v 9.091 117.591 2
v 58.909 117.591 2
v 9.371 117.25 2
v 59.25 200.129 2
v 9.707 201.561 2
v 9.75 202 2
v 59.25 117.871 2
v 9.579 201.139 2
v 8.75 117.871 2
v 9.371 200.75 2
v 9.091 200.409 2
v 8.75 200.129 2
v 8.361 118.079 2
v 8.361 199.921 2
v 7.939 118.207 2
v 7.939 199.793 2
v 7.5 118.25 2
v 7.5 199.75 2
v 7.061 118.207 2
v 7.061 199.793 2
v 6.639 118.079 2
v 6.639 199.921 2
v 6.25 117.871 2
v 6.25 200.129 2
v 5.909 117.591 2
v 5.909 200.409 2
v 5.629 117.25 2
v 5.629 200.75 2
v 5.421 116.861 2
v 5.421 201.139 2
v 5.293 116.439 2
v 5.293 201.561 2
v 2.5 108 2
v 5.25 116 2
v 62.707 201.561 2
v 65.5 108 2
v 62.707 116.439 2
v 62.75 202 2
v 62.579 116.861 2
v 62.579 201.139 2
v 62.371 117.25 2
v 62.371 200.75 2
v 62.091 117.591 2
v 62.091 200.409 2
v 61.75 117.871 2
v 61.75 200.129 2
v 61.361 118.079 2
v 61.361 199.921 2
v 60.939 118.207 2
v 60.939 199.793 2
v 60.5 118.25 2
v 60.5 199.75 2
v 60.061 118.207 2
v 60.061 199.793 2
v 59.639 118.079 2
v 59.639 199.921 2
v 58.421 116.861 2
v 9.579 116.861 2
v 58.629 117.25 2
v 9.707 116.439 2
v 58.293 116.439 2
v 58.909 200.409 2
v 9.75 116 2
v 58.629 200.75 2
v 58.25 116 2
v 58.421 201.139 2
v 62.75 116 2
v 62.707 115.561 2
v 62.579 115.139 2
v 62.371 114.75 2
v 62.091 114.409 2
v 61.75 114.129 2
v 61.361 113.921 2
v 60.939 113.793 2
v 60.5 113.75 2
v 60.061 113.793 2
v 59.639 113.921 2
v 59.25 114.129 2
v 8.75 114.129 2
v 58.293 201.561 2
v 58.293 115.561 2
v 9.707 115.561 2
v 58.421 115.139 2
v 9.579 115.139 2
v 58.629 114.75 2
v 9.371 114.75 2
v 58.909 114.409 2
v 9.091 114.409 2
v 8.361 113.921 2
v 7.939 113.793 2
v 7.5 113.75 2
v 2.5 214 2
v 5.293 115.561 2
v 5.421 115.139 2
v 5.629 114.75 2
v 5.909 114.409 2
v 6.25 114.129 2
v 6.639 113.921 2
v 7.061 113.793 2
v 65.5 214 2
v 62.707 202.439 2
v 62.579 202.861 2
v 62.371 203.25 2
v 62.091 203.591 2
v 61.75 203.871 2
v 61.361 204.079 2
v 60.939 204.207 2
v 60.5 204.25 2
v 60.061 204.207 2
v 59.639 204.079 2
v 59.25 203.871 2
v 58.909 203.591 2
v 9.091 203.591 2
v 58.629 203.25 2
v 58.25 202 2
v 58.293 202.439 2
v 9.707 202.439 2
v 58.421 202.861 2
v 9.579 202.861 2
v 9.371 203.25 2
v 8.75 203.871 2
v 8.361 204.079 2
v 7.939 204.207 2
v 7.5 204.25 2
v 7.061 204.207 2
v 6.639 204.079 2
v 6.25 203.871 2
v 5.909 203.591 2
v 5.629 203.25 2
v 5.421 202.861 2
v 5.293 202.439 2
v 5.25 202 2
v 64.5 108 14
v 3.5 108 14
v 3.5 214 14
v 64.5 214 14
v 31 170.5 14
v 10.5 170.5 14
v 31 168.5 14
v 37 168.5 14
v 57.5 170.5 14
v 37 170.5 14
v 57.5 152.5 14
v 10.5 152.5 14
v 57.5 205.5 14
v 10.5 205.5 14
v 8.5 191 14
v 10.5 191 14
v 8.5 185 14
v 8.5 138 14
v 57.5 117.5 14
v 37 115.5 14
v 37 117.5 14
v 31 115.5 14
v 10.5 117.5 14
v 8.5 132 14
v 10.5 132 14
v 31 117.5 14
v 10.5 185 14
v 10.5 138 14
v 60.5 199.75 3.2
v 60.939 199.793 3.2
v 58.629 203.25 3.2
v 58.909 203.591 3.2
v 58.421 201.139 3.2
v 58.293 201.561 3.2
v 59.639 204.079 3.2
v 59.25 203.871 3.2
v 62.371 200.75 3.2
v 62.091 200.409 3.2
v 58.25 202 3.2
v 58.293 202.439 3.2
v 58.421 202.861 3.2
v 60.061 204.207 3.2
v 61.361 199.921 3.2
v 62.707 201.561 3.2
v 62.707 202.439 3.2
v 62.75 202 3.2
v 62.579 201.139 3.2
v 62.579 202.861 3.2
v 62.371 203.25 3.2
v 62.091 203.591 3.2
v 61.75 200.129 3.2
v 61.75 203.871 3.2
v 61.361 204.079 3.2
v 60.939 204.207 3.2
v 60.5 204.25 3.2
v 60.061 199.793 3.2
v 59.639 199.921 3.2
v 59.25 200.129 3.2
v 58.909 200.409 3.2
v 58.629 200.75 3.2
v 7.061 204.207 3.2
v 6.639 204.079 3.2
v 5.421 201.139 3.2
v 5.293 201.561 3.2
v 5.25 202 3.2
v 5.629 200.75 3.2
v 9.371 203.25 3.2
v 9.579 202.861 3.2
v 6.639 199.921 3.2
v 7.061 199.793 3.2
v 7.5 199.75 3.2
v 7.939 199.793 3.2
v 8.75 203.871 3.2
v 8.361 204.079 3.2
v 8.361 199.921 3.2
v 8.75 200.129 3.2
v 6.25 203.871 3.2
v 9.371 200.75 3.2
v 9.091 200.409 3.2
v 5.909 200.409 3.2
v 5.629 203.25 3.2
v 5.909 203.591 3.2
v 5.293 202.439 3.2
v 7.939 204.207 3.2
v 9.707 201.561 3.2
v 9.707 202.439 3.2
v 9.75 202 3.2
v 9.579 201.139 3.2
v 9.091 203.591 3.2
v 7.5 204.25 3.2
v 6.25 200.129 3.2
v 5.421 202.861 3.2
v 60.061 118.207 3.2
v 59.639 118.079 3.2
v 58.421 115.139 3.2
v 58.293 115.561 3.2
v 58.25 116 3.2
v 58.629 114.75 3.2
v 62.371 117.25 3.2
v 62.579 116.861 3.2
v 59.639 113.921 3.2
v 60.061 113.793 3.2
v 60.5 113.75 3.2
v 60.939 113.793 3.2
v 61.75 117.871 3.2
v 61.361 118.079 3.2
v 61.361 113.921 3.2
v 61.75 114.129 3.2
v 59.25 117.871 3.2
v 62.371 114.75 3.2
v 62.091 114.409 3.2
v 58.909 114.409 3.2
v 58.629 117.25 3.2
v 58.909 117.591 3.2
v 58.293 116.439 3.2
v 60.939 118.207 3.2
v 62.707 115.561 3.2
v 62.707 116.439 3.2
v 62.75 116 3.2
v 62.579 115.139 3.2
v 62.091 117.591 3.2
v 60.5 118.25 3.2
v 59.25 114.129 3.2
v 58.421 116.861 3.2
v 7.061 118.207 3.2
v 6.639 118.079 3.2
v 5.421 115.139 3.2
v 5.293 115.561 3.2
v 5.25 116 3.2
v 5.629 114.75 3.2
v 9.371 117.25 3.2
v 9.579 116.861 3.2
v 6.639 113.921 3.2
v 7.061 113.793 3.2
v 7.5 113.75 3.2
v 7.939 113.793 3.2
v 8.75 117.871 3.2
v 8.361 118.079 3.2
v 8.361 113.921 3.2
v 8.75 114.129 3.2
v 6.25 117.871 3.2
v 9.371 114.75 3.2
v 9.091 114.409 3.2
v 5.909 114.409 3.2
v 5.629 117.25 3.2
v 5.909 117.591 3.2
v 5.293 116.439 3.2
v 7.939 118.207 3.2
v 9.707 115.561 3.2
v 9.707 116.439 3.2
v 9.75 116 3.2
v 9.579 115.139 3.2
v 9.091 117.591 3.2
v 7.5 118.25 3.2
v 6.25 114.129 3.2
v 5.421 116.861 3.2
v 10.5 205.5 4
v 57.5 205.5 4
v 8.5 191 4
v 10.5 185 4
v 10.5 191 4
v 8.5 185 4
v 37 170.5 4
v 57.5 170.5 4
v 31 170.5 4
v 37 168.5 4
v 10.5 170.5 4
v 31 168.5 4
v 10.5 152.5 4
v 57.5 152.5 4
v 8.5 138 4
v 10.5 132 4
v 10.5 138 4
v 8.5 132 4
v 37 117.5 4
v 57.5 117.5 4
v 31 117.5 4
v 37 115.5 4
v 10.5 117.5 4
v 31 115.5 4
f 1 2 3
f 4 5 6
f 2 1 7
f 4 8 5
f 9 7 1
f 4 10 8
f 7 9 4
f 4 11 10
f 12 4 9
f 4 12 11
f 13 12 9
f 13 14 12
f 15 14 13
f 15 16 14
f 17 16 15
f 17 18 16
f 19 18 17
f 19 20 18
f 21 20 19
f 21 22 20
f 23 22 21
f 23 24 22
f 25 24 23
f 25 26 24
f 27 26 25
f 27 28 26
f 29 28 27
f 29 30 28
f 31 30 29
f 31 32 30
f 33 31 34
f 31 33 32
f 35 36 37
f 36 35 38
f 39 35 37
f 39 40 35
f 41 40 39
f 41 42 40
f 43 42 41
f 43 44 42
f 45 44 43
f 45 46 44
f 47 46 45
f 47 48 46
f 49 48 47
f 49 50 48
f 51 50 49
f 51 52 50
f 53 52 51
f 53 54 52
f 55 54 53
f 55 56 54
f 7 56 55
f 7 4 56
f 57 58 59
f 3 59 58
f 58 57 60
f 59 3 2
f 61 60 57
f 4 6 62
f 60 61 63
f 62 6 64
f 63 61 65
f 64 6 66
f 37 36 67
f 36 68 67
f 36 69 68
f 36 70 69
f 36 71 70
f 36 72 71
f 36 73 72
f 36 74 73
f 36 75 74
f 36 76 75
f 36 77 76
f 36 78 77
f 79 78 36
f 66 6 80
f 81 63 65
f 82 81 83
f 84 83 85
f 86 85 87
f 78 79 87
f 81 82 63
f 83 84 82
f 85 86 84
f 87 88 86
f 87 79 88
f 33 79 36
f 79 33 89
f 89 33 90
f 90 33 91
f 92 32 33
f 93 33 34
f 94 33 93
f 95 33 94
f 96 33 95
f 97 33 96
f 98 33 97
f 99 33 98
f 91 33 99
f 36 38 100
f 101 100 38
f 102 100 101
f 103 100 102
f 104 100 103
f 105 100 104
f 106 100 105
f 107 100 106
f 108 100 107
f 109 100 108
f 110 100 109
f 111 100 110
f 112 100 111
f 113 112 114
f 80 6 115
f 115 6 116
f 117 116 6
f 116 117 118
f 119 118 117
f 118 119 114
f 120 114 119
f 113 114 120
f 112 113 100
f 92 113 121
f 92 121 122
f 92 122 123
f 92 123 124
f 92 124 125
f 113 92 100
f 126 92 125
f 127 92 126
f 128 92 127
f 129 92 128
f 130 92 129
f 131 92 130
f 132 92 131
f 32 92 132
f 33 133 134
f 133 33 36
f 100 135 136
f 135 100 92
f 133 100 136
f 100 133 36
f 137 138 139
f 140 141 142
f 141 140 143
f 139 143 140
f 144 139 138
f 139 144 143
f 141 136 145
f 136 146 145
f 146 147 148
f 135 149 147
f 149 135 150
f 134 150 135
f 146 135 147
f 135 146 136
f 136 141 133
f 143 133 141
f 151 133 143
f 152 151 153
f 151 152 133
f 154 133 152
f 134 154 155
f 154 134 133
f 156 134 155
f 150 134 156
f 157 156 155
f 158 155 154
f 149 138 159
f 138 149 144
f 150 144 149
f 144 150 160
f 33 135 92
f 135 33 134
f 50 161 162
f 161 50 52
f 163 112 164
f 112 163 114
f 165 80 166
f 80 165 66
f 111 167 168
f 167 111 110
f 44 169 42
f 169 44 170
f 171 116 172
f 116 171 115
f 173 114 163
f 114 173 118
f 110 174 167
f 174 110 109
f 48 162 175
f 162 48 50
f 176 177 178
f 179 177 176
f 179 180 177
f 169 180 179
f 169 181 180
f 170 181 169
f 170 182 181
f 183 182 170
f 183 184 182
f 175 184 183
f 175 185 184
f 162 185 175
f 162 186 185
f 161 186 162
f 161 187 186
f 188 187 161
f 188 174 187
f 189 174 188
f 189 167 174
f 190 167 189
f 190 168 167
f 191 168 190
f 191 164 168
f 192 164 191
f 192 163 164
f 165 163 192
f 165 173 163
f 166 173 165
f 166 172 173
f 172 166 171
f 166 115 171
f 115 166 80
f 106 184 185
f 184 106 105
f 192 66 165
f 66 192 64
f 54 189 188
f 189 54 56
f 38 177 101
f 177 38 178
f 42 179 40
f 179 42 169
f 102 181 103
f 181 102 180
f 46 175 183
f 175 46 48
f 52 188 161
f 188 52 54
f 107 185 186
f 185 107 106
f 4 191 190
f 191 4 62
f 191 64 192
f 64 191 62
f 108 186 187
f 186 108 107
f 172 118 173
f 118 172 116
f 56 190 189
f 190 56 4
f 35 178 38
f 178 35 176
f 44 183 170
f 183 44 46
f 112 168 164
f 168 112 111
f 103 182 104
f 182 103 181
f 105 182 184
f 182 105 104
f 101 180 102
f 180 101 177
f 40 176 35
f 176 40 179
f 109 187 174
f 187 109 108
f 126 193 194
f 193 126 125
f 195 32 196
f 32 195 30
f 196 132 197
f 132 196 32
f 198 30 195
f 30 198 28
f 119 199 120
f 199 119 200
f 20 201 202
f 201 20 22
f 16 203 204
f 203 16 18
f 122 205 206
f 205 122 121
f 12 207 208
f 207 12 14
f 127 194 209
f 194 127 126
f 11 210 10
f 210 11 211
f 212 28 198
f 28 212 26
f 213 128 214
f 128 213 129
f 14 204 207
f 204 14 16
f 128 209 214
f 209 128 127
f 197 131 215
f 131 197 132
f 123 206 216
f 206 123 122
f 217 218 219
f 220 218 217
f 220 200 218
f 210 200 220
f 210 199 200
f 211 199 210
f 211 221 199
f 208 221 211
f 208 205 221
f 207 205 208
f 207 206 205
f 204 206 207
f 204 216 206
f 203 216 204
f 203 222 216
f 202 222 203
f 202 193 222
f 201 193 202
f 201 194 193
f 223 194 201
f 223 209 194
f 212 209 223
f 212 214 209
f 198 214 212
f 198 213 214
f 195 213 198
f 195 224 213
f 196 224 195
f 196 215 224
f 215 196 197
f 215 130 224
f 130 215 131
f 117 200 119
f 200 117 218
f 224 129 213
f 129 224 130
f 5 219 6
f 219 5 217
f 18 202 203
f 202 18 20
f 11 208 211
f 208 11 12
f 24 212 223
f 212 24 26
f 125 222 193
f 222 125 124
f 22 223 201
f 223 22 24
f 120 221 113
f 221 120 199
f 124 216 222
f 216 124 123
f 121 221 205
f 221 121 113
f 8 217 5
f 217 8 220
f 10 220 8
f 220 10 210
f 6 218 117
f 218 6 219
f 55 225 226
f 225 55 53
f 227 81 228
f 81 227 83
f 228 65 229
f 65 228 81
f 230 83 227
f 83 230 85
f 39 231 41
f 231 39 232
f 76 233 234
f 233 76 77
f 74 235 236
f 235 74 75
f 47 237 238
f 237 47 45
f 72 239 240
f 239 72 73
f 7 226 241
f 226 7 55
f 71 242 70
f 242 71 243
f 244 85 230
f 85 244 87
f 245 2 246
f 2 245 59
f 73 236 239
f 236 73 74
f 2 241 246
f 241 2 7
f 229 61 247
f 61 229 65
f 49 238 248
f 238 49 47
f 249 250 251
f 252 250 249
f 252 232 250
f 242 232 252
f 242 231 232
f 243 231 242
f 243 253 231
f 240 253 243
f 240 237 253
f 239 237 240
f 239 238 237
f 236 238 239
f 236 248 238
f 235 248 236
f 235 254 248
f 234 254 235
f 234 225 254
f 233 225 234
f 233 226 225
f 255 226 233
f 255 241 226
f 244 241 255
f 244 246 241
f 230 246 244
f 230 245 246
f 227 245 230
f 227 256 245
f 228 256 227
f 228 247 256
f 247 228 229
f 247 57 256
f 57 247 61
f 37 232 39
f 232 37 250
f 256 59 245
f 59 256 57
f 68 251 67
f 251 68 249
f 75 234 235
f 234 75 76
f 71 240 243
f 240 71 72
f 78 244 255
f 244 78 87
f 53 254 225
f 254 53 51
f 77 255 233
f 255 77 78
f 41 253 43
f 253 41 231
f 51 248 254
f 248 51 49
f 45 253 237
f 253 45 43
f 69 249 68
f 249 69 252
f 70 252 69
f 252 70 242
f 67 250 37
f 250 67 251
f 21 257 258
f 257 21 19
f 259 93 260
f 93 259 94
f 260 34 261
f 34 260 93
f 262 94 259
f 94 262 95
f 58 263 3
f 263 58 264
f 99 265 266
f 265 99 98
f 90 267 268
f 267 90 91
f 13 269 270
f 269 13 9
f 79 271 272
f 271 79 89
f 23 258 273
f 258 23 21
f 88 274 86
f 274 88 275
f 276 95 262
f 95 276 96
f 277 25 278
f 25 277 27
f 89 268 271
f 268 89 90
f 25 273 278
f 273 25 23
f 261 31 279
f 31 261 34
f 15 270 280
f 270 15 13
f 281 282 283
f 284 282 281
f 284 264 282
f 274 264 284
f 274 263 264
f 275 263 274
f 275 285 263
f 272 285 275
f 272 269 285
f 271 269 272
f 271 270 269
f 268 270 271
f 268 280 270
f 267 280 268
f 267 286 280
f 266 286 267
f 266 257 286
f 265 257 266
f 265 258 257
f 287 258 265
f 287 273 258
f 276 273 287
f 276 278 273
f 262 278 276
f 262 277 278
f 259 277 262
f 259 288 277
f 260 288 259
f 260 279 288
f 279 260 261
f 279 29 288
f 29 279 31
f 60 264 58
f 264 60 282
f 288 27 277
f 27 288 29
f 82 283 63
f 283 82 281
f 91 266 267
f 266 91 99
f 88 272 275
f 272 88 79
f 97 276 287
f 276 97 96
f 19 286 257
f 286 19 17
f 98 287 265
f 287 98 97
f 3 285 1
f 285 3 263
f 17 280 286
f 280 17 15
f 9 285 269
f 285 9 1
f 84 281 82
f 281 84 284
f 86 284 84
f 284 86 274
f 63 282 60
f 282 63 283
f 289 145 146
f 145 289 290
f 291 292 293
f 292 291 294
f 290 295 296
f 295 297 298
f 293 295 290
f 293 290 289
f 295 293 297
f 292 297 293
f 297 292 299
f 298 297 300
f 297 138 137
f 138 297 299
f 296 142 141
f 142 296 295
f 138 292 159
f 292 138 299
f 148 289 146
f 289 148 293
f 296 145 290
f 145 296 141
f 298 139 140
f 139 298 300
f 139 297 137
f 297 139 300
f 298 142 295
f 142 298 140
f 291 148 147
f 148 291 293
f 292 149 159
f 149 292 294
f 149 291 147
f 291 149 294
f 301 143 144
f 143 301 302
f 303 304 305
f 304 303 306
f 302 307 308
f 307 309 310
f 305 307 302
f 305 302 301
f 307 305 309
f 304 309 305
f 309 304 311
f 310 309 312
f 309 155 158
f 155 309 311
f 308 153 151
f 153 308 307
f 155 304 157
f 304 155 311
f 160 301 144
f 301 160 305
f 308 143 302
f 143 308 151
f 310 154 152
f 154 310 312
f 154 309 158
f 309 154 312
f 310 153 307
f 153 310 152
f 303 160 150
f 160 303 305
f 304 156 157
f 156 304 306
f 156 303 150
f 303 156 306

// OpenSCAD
// file: Commons.scad
arduino_depth = 53.5;
arduino_width = 69;
arduino_mega_width = 102;

raspberry_depth = 56;
raspberry_width = 85;

breadboard_width = 166;
breadboard_depth = 55;
breadboard_height = 10;

mini_breadboard_depth = 34;
mini_breadboard_width = 46;

magnet_height = 1.2;
magnet_diameter = 4;

delta = 0.5;

plate_thickness = 2;
wall_thickness = 2;

slot_width = arduino_mega_width + 2*wall_thickness; // 106
slot_depth = raspberry_depth + 2*wall_thickness + 2 + 2*delta; // 63

width = 2*slot_width + wall_thickness; // 214
depth = slot_depth + breadboard_depth + 3*wall_thickness + 1 + 4*delta; // 125
height = breadboard_height + plate_thickness; // height over plate, 12

small_slot_depth = depth - slot_depth - 2*wall_thickness - 2*delta; // 58
small_slot_width = width - breadboard_width - 3*wall_thickness - 1 - 4*delta; // 39


module module_frame() {
    difference() {
        union() {
            translate([wall_thickness + 1, 0, 0])
                cube([slot_depth - 2*wall_thickness - 2, slot_width, plate_thickness]);

            translate([0, slot_width, 0]) rotate([90, 0, 0]) linear_extrude(slot_width)
                polygon([[0, 0], [1, height], [3, height], [3, 0]]);

            translate([slot_depth - wall_thickness - 1, slot_width, 0]) rotate([90, 0, 0]) linear_extrude(slot_width)
                polygon([[0, 0], [0, height], [wall_thickness, height], [3, 0]]);
        }
        
        magnet_hole(5, wall_thickness + 10, -delta);
        magnet_hole(slot_depth - 5, wall_thickness + 10, -delta);
        magnet_hole(5, wall_thickness + slot_width - 10, -delta);
        magnet_hole(slot_depth - 5, wall_thickness + slot_width - 10, -delta);       
    }

    translate([wall_thickness + 1, slot_width - 1, plate_thickness])
        cube([slot_depth - 2*wall_thickness - 2, 1, height - plate_thickness]);
}

module small_module_frame() {
    difference() {
        union() {
            translate([0, wall_thickness + 1, 0])
                cube([small_slot_depth, small_slot_width - 2*wall_thickness - 2, plate_thickness]);

            rotate([90, 0, 90]) linear_extrude(small_slot_depth)
                polygon([[0, 0], [1, height], [wall_thickness + 1, height], [wall_thickness + 1, 0]]);

            translate([0, small_slot_width - wall_thickness - 1, 0]) rotate([90, 0, 90]) linear_extrude(small_slot_depth)
                polygon([[0, 0], [0, height], [wall_thickness, height], [wall_thickness + 1, 0]]);

            translate([0, wall_thickness + 1, 0])
                cube([1, small_slot_width - 2*wall_thickness - 2, height]);
        }
        
        magnet_hole(8, 8, -delta);
        magnet_hole(8, small_slot_width - 8, -delta);
        magnet_hole(small_slot_depth - 8, 8, -delta);
        magnet_hole(small_slot_depth - 8, small_slot_width - 8, -delta);
    }
}

module breadboard_hole() {
    cube([breadboard_depth + 2*delta, breadboard_width + 2*delta, breadboard_height + delta]);
    
    translate([breadboard_depth - delta, 11 + delta, 0])
        cube([2.5, 6, breadboard_height + delta]);
    translate([breadboard_depth - delta, breadboard_width/2 - 3 + delta, 0])
        cube([2.5, 6, breadboard_height + delta]);
    translate([breadboard_depth - delta, breadboard_width - 17 - delta, 0])
        cube([2.5, 6, breadboard_height + delta]);
}

module half_breadboard_hole() {
    cube([breadboard_depth + 2*delta, breadboard_width/2 + 2*delta, breadboard_height + delta]);
    
    translate([-2, 11 + delta, 0])
        cube([2.5, 6, breadboard_height + delta]);
    translate([-2, breadboard_width/2 - 17 - delta, 0])
        cube([2.5, 6, breadboard_height + delta]);
    translate([2 + delta, -2, 0])
        cube([6, 2.5, breadboard_height + delta]);
    translate([breadboard_depth/2 - 3 + delta, -2, 0])
        cube([6, 2.5, breadboard_height + delta]);
    translate([breadboard_depth - 8 - delta, -2, 0])
        cube([6, 2.5, breadboard_height + delta]);
}

module mini_breadboard_hole() {
    cube([mini_breadboard_depth + 2*delta, mini_breadboard_width + 2*delta, breadboard_height + delta]);
    
    translate([-2, mini_breadboard_width/2 - 3 + delta, 0])
        cube([2.5, 6, breadboard_height + delta]);
    translate([mini_breadboard_depth/2 - 3 + delta, mini_breadboard_width + 2*delta - 0.5, 0])
        cube([6, 2.5, breadboard_height + delta]);
}

module magnet_hole(x, y, z) {
    translate([x, y, z])
        cylinder(h = magnet_height + delta, d = magnet_diameter + delta, $fn=32);
}

module screw_mount(x = 0, y = 0, z = 0, h = 5) {
    holeRadius = 3 / 2;

    translate([x, y, z])
        difference() {
            cylinder(h, r1 = holeRadius + 2, r2 = holeRadius + 1);
            
            translate([0, 0, -0.5])
                cylinder(h + 1, r = holeRadius);
        }
}
// main file
include <Commons.scad>

translate([slot_depth + wall_thickness + delta, 2*slot_width + wall_thickness, plate_thickness]) rotate([0, 0, 180])
    Two_Mini_Breadboards_Module();


module Two_Mini_Breadboards_Module() {
    difference() {
        union() {
            module_frame();

            translate([wall_thickness + 1, 0, plate_thickness])
                cube([slot_depth - 2*wall_thickness - 2, slot_width, breadboard_height]);
        }

        translate([(slot_depth - mini_breadboard_width - 2*delta)/2, (slot_width - 87 - 2*delta)/2, plate_thickness])
            rotated_mini_breadboard_hole();
        translate([(slot_depth - mini_breadboard_width - 2*delta)/2, (slot_width - 87 - 2*delta)/2 + 53, plate_thickness])
            rotated_mini_breadboard_hole();
    }
}

module rotated_mini_breadboard_hole() {
    translate([0, mini_breadboard_depth + delta]) rotate([0, 0, 270])
        mini_breadboard_hole();
}
